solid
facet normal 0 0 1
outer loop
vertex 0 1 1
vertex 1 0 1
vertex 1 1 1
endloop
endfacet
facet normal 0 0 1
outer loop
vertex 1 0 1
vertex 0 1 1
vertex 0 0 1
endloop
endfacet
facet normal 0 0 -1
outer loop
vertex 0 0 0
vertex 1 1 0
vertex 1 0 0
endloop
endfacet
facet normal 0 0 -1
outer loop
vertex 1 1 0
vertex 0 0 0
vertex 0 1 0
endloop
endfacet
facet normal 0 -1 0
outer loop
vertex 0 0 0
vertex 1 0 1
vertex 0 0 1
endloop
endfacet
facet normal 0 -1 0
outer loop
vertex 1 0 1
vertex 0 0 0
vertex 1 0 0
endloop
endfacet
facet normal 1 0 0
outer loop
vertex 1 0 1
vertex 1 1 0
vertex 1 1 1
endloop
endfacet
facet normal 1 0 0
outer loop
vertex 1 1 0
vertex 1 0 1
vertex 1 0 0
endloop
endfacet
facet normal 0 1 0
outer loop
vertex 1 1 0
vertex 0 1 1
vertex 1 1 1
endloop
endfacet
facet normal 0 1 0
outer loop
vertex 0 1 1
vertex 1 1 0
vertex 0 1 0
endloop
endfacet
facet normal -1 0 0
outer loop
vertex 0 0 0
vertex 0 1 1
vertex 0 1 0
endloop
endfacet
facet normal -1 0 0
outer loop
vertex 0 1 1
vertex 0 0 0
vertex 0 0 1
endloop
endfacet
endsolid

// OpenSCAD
// { inside line comment does not stop extraction
/* { inside block comment does not stop extraction } */
dup = 1; // [0:10]
keep = 2; // [0:5]
removed = 3; // [0:10]

function helper(x) = x * 2;
echo("header echo", keep);
cube(1);

dup = 4; // [0:2:8]
removed = helper(2);

module part() {
    after_brace_local = 99;
    sphere(1);
}

after_brace_top = 100; // [0:200]
